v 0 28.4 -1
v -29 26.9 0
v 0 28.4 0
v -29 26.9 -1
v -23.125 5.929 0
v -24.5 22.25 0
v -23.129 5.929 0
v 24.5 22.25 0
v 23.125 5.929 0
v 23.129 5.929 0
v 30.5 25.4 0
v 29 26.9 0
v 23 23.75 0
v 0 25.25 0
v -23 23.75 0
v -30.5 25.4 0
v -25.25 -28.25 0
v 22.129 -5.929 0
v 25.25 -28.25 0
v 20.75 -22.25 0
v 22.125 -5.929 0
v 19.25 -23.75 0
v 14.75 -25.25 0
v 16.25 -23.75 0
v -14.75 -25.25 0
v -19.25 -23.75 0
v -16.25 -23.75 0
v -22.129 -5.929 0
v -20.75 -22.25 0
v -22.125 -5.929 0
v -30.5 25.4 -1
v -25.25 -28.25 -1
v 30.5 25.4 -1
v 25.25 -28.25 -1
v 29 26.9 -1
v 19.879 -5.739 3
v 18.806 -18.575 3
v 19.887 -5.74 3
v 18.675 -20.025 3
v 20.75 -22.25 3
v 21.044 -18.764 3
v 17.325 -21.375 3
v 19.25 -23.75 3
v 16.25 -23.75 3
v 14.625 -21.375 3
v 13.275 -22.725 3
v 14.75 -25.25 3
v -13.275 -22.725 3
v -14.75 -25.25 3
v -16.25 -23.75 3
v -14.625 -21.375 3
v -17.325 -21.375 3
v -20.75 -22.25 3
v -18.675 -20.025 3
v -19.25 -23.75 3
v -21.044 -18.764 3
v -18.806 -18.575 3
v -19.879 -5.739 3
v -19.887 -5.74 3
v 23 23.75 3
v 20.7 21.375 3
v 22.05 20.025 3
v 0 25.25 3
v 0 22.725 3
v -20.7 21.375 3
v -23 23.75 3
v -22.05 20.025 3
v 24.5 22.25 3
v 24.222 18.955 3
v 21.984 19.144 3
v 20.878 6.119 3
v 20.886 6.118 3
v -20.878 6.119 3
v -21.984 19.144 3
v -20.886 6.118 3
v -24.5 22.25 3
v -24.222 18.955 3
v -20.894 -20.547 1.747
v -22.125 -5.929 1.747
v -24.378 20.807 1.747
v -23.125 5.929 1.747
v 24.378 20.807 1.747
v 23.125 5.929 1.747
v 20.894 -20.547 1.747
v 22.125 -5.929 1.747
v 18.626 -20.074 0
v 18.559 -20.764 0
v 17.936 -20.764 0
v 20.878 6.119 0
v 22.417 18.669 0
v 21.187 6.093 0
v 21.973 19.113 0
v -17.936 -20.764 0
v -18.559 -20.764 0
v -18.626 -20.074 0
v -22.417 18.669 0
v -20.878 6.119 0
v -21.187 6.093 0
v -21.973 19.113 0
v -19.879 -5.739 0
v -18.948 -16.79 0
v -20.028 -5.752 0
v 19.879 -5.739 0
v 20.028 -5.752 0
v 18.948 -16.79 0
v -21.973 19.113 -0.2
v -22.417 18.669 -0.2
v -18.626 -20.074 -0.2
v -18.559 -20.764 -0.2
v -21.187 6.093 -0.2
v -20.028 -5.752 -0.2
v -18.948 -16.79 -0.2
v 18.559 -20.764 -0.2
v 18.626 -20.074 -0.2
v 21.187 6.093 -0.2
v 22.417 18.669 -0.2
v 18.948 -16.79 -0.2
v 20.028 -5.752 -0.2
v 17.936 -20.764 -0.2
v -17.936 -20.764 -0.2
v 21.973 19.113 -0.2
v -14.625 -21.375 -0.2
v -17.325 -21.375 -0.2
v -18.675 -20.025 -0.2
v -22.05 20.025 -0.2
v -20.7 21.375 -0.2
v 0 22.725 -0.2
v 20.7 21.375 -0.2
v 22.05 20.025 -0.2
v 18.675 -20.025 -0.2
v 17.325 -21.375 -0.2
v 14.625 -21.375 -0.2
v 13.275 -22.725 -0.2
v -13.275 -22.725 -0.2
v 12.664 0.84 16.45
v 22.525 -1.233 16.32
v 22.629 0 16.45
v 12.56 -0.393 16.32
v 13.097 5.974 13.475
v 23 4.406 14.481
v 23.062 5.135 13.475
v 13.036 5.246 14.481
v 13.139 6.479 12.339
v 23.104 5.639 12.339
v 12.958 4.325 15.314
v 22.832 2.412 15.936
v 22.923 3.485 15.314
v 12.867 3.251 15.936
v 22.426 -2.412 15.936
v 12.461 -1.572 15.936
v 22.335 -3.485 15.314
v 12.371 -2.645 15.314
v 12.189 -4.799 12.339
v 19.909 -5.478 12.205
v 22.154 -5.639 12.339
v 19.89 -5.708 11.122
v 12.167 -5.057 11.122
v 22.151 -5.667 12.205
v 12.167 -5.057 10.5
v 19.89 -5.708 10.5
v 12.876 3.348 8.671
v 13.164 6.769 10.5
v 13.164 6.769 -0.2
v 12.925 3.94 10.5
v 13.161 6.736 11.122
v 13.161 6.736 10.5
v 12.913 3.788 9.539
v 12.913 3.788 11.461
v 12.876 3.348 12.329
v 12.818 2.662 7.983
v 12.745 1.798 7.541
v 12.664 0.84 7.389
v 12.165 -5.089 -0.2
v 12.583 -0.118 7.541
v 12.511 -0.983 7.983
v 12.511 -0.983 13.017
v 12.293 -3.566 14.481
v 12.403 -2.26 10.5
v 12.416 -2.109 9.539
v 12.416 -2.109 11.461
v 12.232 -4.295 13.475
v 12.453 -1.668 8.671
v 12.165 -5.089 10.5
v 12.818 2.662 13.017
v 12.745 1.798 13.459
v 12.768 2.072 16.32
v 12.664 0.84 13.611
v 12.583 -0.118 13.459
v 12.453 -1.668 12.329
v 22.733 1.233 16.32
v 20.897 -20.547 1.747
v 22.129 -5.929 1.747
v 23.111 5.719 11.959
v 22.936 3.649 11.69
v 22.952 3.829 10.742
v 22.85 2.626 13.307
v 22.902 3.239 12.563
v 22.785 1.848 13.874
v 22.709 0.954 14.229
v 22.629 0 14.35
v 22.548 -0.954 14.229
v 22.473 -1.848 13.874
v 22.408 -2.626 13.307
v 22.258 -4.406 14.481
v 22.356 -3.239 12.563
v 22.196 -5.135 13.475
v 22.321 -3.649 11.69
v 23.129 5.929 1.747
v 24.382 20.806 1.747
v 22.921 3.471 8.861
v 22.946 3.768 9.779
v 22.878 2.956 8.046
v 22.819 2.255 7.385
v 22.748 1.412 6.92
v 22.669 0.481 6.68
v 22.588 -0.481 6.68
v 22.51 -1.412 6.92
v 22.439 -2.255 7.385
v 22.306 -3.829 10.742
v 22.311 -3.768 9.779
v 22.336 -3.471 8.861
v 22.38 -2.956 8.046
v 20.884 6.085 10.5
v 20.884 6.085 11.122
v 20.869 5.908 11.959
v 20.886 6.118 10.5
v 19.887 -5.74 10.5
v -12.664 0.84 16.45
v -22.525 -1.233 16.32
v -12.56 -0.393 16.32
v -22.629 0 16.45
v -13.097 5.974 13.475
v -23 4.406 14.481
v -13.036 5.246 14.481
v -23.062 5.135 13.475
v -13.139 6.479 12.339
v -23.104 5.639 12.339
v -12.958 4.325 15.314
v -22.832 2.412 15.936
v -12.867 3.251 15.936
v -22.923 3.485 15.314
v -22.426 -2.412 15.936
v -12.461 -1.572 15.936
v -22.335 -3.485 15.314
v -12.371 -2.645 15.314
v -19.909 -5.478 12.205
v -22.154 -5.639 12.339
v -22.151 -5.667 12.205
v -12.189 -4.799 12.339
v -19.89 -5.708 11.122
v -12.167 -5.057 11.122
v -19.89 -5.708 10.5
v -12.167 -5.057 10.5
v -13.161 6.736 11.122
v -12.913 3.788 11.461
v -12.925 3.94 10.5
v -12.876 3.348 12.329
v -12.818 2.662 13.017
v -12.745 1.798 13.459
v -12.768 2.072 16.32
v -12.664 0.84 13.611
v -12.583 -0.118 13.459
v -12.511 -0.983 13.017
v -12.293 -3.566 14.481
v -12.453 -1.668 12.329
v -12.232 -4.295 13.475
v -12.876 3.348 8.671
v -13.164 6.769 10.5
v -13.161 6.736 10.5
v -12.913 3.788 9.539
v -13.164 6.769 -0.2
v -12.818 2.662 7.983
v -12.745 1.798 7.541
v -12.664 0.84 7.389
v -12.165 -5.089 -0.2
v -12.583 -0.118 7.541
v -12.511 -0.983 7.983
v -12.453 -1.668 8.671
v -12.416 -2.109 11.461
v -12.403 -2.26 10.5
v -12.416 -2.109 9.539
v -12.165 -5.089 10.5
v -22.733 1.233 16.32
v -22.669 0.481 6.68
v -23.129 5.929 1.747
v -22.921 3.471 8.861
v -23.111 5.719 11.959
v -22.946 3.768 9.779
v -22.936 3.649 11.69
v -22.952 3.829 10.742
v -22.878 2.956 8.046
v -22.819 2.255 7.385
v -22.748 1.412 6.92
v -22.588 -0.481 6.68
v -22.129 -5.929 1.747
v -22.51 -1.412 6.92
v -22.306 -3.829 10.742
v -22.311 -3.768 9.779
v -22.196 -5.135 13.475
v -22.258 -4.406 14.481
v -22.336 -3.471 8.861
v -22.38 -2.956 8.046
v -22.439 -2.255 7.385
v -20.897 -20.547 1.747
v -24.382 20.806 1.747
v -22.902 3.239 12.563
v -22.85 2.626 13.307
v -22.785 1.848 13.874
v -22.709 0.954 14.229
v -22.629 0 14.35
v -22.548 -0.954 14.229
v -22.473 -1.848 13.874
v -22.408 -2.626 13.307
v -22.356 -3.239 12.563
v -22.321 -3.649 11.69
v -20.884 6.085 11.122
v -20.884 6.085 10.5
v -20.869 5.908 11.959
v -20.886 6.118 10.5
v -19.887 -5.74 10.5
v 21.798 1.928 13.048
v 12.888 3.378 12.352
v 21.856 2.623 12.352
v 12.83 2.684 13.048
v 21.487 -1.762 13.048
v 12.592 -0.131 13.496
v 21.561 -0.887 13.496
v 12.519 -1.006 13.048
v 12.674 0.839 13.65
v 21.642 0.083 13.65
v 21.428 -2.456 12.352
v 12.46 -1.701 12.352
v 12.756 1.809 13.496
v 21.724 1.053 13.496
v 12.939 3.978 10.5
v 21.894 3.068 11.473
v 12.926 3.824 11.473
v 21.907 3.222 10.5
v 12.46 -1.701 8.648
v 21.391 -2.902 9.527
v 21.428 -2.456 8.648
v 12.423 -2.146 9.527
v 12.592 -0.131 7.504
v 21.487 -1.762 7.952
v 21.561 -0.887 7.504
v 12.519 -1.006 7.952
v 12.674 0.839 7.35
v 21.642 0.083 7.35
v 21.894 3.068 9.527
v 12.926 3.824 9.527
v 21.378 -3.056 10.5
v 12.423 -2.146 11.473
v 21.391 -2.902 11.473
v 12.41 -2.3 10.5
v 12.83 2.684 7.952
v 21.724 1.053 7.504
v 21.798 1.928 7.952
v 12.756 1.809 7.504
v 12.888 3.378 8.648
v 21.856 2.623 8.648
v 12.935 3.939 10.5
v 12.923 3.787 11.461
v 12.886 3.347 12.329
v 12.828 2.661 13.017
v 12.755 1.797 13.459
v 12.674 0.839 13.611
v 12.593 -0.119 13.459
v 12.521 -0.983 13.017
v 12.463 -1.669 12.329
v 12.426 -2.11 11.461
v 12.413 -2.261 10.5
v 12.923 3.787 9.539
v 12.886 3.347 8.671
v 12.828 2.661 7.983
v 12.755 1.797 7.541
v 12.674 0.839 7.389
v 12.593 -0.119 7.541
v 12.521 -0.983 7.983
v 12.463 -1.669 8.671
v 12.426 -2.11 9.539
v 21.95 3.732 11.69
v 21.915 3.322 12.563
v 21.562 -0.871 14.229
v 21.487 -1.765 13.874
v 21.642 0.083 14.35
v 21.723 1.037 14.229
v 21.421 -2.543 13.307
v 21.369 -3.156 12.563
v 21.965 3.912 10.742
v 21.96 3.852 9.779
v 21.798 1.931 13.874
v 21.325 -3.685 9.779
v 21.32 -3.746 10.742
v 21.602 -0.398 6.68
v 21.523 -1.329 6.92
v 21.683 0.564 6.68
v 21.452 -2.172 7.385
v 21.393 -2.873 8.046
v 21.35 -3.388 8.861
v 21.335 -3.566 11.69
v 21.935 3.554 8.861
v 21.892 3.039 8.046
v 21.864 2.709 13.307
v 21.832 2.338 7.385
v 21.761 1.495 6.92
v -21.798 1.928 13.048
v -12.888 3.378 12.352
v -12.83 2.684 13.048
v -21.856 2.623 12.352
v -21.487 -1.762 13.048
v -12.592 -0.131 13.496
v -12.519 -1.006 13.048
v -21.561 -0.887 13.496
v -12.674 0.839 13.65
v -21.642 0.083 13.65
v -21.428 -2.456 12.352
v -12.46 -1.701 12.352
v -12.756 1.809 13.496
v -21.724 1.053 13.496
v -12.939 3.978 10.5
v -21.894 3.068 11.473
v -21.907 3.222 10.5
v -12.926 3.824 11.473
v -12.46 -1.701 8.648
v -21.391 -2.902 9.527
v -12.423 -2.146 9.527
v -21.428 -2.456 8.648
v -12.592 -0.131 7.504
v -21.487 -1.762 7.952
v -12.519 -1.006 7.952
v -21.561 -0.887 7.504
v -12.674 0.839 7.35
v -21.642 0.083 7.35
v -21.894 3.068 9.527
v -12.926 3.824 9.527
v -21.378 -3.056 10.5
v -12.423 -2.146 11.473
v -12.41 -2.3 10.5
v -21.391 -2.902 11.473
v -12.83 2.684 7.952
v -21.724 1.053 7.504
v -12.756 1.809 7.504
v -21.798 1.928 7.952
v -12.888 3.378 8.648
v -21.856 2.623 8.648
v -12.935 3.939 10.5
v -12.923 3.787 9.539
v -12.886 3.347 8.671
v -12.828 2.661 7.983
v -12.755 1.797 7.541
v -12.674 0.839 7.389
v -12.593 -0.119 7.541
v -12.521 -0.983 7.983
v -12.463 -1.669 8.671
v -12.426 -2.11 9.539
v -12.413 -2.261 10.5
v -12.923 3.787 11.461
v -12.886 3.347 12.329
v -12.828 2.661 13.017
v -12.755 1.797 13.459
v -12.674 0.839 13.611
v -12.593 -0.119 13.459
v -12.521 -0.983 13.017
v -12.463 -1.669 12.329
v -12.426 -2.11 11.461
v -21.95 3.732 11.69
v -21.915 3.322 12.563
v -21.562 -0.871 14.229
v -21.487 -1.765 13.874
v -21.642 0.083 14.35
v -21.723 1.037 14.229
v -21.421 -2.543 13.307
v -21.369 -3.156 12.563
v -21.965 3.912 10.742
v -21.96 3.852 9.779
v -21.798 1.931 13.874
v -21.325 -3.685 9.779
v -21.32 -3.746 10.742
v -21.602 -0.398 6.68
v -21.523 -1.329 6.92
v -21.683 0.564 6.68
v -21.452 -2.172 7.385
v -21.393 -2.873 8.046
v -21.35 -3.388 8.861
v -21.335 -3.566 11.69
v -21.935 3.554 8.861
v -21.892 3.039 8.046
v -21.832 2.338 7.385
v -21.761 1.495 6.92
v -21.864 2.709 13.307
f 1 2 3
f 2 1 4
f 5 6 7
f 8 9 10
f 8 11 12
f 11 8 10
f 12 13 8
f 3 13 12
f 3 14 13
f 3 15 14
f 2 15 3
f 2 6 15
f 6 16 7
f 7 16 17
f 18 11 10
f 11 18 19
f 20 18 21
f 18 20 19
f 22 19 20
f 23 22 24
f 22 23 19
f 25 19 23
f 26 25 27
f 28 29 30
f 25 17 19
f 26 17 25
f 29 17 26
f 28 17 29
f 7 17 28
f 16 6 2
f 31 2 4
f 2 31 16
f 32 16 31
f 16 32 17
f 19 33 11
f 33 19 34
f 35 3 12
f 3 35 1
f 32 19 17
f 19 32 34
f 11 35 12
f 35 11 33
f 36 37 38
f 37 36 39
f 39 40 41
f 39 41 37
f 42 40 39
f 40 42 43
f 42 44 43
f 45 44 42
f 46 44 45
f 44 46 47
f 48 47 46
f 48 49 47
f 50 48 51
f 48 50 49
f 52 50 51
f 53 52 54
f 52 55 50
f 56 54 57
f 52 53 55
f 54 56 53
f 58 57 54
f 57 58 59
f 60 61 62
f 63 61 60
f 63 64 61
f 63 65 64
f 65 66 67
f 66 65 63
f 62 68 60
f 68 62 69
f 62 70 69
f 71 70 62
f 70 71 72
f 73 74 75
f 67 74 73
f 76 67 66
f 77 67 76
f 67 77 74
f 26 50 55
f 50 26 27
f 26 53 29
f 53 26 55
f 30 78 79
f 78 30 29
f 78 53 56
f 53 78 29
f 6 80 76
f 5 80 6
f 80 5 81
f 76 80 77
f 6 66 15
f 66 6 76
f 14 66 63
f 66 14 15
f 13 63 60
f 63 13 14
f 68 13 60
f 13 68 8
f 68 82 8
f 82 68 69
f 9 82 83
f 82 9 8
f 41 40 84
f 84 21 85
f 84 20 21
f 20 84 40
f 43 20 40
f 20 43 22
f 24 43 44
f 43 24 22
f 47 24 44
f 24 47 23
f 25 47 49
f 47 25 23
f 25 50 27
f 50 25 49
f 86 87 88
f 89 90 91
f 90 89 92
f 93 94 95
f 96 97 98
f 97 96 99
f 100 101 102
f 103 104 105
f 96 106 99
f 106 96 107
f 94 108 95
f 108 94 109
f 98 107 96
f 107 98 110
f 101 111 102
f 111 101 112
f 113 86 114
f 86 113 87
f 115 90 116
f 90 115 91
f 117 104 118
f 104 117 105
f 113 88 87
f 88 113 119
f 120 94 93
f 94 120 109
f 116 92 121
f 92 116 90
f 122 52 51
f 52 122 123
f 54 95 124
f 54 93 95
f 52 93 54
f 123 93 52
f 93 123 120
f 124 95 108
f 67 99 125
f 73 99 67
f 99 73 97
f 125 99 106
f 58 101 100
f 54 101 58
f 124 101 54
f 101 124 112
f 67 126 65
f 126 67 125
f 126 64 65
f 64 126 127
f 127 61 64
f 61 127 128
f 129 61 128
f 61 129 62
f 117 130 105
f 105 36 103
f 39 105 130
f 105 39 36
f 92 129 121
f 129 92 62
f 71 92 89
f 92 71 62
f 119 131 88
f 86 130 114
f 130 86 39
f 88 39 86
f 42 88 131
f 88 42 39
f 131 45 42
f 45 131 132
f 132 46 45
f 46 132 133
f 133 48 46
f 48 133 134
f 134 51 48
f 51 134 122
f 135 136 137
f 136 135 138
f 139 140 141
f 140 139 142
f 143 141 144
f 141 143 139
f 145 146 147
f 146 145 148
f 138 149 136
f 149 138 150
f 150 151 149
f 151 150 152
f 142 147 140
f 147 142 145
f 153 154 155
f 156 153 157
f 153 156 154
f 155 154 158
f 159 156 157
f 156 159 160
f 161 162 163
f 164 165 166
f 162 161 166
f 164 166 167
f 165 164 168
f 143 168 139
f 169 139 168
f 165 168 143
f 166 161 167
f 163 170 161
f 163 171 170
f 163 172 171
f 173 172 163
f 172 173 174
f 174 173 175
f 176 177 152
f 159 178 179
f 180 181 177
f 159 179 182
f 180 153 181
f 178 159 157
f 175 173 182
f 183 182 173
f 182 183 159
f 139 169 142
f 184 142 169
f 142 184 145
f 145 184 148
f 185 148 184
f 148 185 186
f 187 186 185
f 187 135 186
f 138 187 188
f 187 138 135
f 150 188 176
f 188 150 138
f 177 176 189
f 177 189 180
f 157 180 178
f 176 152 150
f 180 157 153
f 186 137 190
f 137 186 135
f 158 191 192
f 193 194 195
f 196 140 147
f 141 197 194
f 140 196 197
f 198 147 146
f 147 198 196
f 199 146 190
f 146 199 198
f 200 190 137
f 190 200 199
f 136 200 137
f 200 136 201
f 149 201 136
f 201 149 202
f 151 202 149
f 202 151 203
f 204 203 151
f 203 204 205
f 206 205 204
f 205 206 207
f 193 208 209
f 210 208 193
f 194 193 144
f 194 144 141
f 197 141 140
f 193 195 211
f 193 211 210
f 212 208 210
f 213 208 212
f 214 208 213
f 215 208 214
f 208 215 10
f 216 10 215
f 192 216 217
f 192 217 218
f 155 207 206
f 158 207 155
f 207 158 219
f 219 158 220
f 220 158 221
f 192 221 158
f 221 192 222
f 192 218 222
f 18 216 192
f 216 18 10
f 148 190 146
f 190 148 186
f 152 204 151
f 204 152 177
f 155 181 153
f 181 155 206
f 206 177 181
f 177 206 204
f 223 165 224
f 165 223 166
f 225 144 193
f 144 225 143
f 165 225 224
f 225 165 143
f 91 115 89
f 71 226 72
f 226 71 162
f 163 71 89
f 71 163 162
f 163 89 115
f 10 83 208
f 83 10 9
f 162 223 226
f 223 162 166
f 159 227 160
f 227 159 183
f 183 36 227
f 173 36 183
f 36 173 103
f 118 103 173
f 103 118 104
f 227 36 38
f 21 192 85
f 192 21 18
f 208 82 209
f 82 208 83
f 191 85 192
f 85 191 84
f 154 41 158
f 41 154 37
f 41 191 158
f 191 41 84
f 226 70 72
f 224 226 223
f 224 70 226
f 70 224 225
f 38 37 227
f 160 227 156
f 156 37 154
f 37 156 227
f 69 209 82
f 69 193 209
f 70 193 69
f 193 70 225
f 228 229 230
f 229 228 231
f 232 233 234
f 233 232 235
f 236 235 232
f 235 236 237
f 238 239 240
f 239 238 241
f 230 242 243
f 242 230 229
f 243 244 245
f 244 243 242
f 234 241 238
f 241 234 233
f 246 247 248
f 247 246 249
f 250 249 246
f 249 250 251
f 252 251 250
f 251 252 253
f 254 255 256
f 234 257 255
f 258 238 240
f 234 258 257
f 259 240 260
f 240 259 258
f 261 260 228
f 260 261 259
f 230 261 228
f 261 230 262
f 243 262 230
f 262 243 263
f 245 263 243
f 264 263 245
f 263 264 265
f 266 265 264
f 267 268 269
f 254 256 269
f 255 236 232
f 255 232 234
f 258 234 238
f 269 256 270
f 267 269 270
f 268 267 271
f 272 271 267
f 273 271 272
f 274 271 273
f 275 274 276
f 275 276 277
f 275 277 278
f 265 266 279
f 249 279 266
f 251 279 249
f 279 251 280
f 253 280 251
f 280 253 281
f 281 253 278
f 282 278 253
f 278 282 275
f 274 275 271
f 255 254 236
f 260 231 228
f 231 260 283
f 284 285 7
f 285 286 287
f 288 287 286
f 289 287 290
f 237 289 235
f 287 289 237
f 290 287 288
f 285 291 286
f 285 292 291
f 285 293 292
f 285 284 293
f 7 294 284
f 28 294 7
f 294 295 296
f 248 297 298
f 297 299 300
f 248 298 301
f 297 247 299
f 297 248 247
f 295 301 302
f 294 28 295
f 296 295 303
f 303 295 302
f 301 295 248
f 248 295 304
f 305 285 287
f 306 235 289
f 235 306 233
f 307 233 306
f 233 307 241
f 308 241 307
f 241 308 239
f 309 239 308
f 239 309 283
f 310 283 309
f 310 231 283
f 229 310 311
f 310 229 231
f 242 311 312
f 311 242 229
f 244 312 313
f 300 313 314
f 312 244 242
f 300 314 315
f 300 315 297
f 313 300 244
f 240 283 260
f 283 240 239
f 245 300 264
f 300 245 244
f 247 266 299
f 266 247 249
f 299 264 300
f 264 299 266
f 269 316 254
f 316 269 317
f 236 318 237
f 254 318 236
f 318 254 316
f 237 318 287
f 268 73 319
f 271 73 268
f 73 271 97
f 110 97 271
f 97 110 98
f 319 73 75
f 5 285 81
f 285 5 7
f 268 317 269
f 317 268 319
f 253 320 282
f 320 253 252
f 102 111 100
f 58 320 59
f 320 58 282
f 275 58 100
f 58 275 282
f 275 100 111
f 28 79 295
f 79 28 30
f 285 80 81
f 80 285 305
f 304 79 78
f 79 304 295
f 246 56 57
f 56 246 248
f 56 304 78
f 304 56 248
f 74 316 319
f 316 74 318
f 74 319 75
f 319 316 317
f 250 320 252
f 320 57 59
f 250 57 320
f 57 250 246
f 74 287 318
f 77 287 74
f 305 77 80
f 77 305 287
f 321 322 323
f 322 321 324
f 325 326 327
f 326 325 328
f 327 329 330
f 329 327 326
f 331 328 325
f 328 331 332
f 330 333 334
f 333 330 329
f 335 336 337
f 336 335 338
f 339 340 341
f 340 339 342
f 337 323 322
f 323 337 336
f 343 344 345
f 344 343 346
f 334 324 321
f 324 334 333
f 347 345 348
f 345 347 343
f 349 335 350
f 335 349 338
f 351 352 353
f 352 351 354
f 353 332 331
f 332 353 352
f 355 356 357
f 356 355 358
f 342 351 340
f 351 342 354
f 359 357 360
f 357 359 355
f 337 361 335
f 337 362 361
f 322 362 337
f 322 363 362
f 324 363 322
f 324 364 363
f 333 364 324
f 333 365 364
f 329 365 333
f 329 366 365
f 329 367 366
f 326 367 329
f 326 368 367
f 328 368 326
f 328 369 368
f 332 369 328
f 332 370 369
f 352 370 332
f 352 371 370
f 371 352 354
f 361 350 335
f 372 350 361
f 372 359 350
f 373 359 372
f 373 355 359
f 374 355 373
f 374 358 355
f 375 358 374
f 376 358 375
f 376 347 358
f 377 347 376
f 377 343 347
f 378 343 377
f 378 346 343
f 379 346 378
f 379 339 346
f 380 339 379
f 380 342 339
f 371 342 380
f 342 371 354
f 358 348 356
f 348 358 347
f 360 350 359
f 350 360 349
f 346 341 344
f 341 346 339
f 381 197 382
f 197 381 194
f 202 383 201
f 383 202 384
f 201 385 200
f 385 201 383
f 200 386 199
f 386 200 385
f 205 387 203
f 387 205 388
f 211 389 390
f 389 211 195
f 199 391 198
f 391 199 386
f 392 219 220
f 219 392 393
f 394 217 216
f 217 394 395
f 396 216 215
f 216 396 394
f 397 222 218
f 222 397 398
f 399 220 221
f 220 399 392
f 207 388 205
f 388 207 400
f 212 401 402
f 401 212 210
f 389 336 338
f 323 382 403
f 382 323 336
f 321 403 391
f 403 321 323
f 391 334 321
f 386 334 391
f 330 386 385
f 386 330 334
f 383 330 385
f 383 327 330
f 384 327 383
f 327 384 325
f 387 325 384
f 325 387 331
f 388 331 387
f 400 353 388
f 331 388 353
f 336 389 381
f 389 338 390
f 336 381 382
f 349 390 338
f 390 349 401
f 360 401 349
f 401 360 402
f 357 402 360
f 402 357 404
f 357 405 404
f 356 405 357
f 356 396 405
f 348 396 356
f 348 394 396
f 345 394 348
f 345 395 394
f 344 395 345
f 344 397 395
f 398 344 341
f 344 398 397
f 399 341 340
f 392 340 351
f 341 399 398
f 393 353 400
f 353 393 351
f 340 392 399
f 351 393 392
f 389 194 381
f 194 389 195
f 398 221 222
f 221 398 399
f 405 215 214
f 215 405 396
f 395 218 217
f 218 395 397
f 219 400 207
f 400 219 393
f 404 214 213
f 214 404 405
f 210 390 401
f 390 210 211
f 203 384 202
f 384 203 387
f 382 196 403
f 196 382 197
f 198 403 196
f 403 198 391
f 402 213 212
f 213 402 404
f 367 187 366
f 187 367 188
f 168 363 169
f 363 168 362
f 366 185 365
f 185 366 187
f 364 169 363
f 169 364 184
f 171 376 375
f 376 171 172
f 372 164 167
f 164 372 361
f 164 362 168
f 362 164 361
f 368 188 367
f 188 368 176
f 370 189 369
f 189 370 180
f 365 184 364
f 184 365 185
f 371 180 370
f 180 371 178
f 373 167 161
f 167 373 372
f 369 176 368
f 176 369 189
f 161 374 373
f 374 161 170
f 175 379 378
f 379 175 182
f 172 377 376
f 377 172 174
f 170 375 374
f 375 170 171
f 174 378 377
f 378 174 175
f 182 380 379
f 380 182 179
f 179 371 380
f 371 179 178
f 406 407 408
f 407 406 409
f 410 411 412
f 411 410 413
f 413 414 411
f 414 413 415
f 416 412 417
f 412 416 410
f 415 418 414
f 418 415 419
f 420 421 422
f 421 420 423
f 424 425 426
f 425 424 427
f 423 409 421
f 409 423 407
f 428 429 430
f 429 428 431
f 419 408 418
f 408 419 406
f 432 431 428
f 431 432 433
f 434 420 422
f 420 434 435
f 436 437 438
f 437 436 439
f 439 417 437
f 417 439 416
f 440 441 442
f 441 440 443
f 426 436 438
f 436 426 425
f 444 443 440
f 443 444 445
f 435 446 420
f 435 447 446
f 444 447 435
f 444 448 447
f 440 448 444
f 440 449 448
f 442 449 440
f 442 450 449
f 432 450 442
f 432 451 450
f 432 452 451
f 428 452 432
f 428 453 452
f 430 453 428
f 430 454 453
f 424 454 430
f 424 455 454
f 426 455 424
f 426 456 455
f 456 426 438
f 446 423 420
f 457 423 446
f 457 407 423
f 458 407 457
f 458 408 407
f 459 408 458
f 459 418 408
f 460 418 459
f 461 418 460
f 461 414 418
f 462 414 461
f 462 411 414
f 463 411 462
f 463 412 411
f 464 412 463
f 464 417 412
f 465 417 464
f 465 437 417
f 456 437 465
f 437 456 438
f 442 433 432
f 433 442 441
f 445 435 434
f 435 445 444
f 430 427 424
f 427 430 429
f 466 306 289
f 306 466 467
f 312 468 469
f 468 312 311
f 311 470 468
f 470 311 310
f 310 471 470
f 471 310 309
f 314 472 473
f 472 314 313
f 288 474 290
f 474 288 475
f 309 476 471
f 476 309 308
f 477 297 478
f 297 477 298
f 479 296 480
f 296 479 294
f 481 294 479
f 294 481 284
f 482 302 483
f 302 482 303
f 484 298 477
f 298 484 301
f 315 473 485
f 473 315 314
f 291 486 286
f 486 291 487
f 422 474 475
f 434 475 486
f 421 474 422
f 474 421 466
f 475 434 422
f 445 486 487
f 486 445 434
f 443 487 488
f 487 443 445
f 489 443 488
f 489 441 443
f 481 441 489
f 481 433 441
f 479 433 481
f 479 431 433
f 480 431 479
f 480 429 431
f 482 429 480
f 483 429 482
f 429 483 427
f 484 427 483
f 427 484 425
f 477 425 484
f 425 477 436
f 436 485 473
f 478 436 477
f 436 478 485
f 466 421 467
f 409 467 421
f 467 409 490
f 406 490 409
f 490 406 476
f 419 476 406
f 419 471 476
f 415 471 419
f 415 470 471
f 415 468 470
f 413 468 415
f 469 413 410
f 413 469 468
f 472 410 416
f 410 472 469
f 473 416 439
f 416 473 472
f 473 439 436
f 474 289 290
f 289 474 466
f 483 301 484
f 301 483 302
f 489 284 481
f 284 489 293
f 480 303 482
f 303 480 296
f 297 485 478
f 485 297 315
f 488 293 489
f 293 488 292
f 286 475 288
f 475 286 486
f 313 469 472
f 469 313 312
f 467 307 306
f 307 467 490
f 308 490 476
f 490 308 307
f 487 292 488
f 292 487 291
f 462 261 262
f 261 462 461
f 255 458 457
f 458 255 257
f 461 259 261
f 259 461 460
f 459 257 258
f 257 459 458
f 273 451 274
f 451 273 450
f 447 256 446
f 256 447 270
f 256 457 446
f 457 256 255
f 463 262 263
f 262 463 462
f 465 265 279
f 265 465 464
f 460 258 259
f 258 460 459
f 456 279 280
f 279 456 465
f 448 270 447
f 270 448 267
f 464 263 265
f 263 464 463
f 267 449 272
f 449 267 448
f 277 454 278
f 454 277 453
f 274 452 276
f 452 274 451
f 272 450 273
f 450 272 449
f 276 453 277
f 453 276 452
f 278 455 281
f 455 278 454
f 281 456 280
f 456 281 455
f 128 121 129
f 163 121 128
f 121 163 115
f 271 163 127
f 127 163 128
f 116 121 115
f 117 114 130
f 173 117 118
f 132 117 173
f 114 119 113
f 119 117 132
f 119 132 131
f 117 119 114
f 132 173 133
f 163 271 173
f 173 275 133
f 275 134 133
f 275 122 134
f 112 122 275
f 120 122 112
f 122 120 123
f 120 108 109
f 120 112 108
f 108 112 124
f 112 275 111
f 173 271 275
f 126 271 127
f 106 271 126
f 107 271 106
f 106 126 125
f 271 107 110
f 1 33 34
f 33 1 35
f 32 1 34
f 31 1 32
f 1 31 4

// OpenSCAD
// file: triangles.scad
/*
Triangles.scad
 Author: Tim Koopman
 https://github.com/tkoopman/Delta-Diamond/blob/master/OpenSCAD/Triangles.scad

         angleCA
           /|\
        a / H \ c
         /  |  \
 angleAB ------- angleBC
            b

Standard Parameters
  center: true/false
    If true same as centerXYZ = [true, true, true]

  centerXYZ: Vector of 3 true/false values [CenterX, CenterY, CenterZ]
    center must be left undef

  height: The 3D height of the Triangle. Ignored if heights defined

  heights: Vector of 3 height values heights @ [angleAB, angleBC, angleCA]
    If CenterZ is true each height will be centered individually, this means
    the shape will be different depending on CenterZ. Most times you will want
    CenterZ to be true to get the shape most people want.
*/

/*
Triangle
  a: Length of side a
  b: Length of side b
  angle: angle at point angleAB
*/
module Triangle(
      a, b, angle, height=1, heights=undef,
      center=undef, centerXYZ=[false,false,false])
{
  // Calculate Heights at each point
  heightAB = ((heights==undef) ? height : heights[0])/2;
  heightBC = ((heights==undef) ? height : heights[1])/2;
  heightCA = ((heights==undef) ? height : heights[2])/2;
  centerZ = (center || (center==undef && centerXYZ[2]))?0:max(heightAB,heightBC,heightCA);

  // Calculate Offsets for centering
  offsetX = (center || (center==undef && centerXYZ[0]))?((cos(angle)*a)+b)/3:0;
  offsetY = (center || (center==undef && centerXYZ[1]))?(sin(angle)*a)/3:0;

  pointAB1 = [-offsetX,-offsetY, centerZ-heightAB];
  pointAB2 = [-offsetX,-offsetY, centerZ+heightAB];
  pointBC1 = [b-offsetX,-offsetY, centerZ-heightBC];
  pointBC2 = [b-offsetX,-offsetY, centerZ+heightBC];
  pointCA1 = [(cos(angle)*a)-offsetX,(sin(angle)*a)-offsetY, centerZ-heightCA];
  pointCA2 = [(cos(angle)*a)-offsetX,(sin(angle)*a)-offsetY, centerZ+heightCA];

  polyhedron(
    points=[  pointAB1, pointBC1, pointCA1,
          pointAB2, pointBC2, pointCA2 ],
    faces=[
      [0, 1, 2],
      [3, 5, 4],
      [0, 3, 1],
      [1, 3, 4],
      [1, 4, 2],
      [2, 4, 5],
      [2, 5, 0],
      [0, 5, 3] ] );
}

/*
Isosceles Triangle
  Exactly 2 of the following paramaters must be defined.
  If all 3 defined H will be ignored.
  b: length of side b
  angle: angle at points angleAB & angleBC.
*/
module Isosceles_Triangle(
      b, angle, H=undef, height=1, heights=undef,
      center=undef, centerXYZ=[true, false, false])
{
  valid =   (angle!=undef)?((angle < 90) && (b!=undef||H!=undef)) : (b!=undef&&H!=undef);
  ANGLE = (angle!=undef) ? angle : atan(H / (b/2));
  a = (b==undef)?(H/sin((180-(angle*2))/2)) :
     (b / cos(ANGLE))/2;
  B = (b==undef)? (cos(angle)*a)*2:b;
  if (valid)
  {
    Triangle(a=a, b=B, angle=ANGLE, height=height, heights=heights,
          center=center, centerXYZ=centerXYZ);
  } else {
    echo("Invalid Isosceles_Triangle. Must specify any 2 of b, angle and H, and if angle used angle must be less than 90");
  }
}

/*
Right Angled Triangle
  Create a Right Angled Triangle where the hypotenuse will be calculated.

       |\
      a| \
       |  \
       ----
         b
  a: length of side a
  b: length of side b
*/
module Right_Angled_Triangle(
      a, b, height=1, heights=undef,
      center=undef, centerXYZ=[false, false, false])
{
  Triangle(a=a, b=b, angle=90, height=height, heights=heights,
        center=center, centerXYZ=centerXYZ);
}

/*
Wedge
  Is same as Right Angled Triangle with 2 different heights, and rotated.
  Good for creating support structures.
*/
module Wedge(a, b, w1, w2)
{
  rotate([90,0,0])
    Right_Angled_Triangle(a, b, heights=[w1, w2, w1], centerXYZ=[false, false, true]);
}

/*
Equilateral Triangle
  Create a Equilateral Triangle.

  l: Length of all sides (a, b & c)
  H: Triangle size will be based on the this 2D height
    When using H, l is ignored.
*/
module Equilateral_Triangle(
      l=10, H=undef, height=1, heights=undef,
      center=undef, centerXYZ=[true,false,false])
{
  L = (H==undef)?l:H/sin(60);
  Triangle(a=L,b=L,angle=60,height=height, heights=heights,
        center=center, centerXYZ=centerXYZ);
}

/*
Trapezoid
  Create a Basic Trapezoid (Based on Isosceles_Triangle)

            d
          /----\
         /  |   \
     a  /   H    \ c
       /    |     \
 angle ------------ angle
            b

  b: Length of side b
  angle: Angle at points angleAB & angleBC
  H: The 2D height at which the triangle should be cut to create the trapezoid
  heights: If vector of size 3 (Standard for triangles) both cd & da will be the same height, if vector have 4 values [ab,bc,cd,da] than each point can have different heights.
*/
module Trapezoid(
      b, angle=60, H, height=1, heights=undef,
      center=undef, centerXYZ=[true,false,false])
{
  validAngle = (angle < 90);
  adX = H / tan(angle);

  // Calculate Heights at each point
  heightAB = ((heights==undef) ? height : heights[0])/2;
  heightBC = ((heights==undef) ? height : heights[1])/2;
  heightCD = ((heights==undef) ? height : heights[2])/2;
  heightDA = ((heights==undef) ? height : ((len(heights) > 3)?heights[3]:heights[2]))/2;

  // Centers
  centerX = (center || (center==undef && centerXYZ[0]))?0:b/2;
  centerY = (center || (center==undef && centerXYZ[1]))?0:H/2;
  centerZ = (center || (center==undef && centerXYZ[2]))?0:max(heightAB,heightBC,heightCD,heightDA);

  // Points
  y = H/2;
  bx = b/2;
  dx = (b-(adX*2))/2;

  pointAB1 = [centerX-bx, centerY-y, centerZ-heightAB];
  pointAB2 = [centerX-bx, centerY-y, centerZ+heightAB];
  pointBC1 = [centerX+bx, centerY-y, centerZ-heightBC];
  pointBC2 = [centerX+bx, centerY-y, centerZ+heightBC];
  pointCD1 = [centerX+dx, centerY+y, centerZ-heightCD];
  pointCD2 = [centerX+dx, centerY+y, centerZ+heightCD];
  pointDA1 = [centerX-dx, centerY+y, centerZ-heightDA];
  pointDA2 = [centerX-dx, centerY+y, centerZ+heightDA];

  validH = (adX < b/2);

  if (validAngle && validH)
  {
    polyhedron(
      points=[  pointAB1, pointBC1, pointCD1, pointDA1,
            pointAB2, pointBC2, pointCD2, pointDA2 ],
      triangles=[
        [0, 1, 2],
        [0, 2, 3],
        [4, 6, 5],
        [4, 7, 6],
        [0, 4, 1],
        [1, 4, 5],
        [1, 5, 2],
        [2, 5, 6],
        [2, 6, 3],
        [3, 6, 7],
        [3, 7, 0],
        [0, 7, 4]  ] );
  } else {
    if (!validAngle) echo("Trapezoid invalid, angle must be less than 90");
    else echo("Trapezoid invalid, H is larger than triangle");
  }
}


// Examples
Triangle(a=5, b=15, angle=33, centerXYZ=[true,false,false]);
translate([20,0,0]) Right_Angled_Triangle(a=5, b=20, centerXYZ=[false,true,false]);
translate([45,0,0]) Wedge(a=5, b=20, w1=10, w2=5);
translate([-20,0,0]) Trapezoid(b=20, angle=33, H=4, height=5, centerXYZ=[true,false,true]);

translate([0,10,0]) Isosceles_Triangle(b=20, angle=33);
translate([30,10,0]) Isosceles_Triangle(b=20, H=5);
translate([-30,10,0]) Isosceles_Triangle(angle=33, H=5, center=true);

translate([15,-25,0]) Equilateral_Triangle(l=20);
translate([-15,-25,0]) Equilateral_Triangle(H=20);
// file: noyau_utils.scad
// Same as mirror() but duplicates the children as opposed to just moving them.
module mirrored(v) {
  union() {
    children();
    mirror(v = v)
      children();
  } 
}

// Build a negative rounded corner to soften a square angle. Extra adds more
// material behind the rounded corner, which is sometimes useful to remove
// stuff.
module rounded_edge(radius, height, extra = 0) {
  translate([radius / 2, radius / 2, 0])
    difference() {
      translate([-extra/2, -extra/2, 0])
      cube([radius + .01 + extra, radius + .01 + extra, height + .01], center = true);
      translate([radius / 2, radius /2, 0])
        cylinder(r = radius, h = height + .02, center = true);
    }
}

// Build a cube with the corners in the z plane softened.
module rounded_cube(v, radius) {
  difference() {
    cube(v, center=true);
    mirrored([0, 1, 0]) mirrored([1, 0, 0])
      translate([-v[0]/2,-v[1]/2,0])
        rounded_edge(radius, v[2]);
  }
}

function number_of_circle_fragments(r) =
  $fn>0 ? ($fn >= 3 ? $fn : 3)
        : ceil(max(min(360 / $fa,
                       r * 2 * PI / $fs),
                   5));

// Build a cylinder garanteed to fit and element of the given radius. Aka, a
// little bit larger than a regular cylinder. Very useful with small fn.
module cylinder_outer(height,radius) {
  fn = number_of_circle_fragments(radius);
  fudge = 1 / cos(180 / fn);
  cylinder(h = height, r = radius * fudge, center = true);
}

// examples
translate([20, 20, 0]) rounded_edge(10, 5, 3);
translate([-20, 20, 0]) rounded_cube([20,15,5], 5);
mirrored([1, 0, 0]) translate([-20, -20, 0])difference() {
  cylinder_outer(5, 12, $fn = 6);
  cylinder(h = 6, r = 12, center = true);
}
// main file
use <gps_790_insert.scad>
use <noyau_utils.scad>

rotate([180, 0, 0]) difference() {
  union() {
    shape_with_holes(back_hole = false, amps_inserts = false);
    translate([-24, -25, .2]) cube([48,50,5]);
  }
  translate([-40, -40, 1]) cube([80,80,80]);
 //cube([37,15,35], center = true);
}
